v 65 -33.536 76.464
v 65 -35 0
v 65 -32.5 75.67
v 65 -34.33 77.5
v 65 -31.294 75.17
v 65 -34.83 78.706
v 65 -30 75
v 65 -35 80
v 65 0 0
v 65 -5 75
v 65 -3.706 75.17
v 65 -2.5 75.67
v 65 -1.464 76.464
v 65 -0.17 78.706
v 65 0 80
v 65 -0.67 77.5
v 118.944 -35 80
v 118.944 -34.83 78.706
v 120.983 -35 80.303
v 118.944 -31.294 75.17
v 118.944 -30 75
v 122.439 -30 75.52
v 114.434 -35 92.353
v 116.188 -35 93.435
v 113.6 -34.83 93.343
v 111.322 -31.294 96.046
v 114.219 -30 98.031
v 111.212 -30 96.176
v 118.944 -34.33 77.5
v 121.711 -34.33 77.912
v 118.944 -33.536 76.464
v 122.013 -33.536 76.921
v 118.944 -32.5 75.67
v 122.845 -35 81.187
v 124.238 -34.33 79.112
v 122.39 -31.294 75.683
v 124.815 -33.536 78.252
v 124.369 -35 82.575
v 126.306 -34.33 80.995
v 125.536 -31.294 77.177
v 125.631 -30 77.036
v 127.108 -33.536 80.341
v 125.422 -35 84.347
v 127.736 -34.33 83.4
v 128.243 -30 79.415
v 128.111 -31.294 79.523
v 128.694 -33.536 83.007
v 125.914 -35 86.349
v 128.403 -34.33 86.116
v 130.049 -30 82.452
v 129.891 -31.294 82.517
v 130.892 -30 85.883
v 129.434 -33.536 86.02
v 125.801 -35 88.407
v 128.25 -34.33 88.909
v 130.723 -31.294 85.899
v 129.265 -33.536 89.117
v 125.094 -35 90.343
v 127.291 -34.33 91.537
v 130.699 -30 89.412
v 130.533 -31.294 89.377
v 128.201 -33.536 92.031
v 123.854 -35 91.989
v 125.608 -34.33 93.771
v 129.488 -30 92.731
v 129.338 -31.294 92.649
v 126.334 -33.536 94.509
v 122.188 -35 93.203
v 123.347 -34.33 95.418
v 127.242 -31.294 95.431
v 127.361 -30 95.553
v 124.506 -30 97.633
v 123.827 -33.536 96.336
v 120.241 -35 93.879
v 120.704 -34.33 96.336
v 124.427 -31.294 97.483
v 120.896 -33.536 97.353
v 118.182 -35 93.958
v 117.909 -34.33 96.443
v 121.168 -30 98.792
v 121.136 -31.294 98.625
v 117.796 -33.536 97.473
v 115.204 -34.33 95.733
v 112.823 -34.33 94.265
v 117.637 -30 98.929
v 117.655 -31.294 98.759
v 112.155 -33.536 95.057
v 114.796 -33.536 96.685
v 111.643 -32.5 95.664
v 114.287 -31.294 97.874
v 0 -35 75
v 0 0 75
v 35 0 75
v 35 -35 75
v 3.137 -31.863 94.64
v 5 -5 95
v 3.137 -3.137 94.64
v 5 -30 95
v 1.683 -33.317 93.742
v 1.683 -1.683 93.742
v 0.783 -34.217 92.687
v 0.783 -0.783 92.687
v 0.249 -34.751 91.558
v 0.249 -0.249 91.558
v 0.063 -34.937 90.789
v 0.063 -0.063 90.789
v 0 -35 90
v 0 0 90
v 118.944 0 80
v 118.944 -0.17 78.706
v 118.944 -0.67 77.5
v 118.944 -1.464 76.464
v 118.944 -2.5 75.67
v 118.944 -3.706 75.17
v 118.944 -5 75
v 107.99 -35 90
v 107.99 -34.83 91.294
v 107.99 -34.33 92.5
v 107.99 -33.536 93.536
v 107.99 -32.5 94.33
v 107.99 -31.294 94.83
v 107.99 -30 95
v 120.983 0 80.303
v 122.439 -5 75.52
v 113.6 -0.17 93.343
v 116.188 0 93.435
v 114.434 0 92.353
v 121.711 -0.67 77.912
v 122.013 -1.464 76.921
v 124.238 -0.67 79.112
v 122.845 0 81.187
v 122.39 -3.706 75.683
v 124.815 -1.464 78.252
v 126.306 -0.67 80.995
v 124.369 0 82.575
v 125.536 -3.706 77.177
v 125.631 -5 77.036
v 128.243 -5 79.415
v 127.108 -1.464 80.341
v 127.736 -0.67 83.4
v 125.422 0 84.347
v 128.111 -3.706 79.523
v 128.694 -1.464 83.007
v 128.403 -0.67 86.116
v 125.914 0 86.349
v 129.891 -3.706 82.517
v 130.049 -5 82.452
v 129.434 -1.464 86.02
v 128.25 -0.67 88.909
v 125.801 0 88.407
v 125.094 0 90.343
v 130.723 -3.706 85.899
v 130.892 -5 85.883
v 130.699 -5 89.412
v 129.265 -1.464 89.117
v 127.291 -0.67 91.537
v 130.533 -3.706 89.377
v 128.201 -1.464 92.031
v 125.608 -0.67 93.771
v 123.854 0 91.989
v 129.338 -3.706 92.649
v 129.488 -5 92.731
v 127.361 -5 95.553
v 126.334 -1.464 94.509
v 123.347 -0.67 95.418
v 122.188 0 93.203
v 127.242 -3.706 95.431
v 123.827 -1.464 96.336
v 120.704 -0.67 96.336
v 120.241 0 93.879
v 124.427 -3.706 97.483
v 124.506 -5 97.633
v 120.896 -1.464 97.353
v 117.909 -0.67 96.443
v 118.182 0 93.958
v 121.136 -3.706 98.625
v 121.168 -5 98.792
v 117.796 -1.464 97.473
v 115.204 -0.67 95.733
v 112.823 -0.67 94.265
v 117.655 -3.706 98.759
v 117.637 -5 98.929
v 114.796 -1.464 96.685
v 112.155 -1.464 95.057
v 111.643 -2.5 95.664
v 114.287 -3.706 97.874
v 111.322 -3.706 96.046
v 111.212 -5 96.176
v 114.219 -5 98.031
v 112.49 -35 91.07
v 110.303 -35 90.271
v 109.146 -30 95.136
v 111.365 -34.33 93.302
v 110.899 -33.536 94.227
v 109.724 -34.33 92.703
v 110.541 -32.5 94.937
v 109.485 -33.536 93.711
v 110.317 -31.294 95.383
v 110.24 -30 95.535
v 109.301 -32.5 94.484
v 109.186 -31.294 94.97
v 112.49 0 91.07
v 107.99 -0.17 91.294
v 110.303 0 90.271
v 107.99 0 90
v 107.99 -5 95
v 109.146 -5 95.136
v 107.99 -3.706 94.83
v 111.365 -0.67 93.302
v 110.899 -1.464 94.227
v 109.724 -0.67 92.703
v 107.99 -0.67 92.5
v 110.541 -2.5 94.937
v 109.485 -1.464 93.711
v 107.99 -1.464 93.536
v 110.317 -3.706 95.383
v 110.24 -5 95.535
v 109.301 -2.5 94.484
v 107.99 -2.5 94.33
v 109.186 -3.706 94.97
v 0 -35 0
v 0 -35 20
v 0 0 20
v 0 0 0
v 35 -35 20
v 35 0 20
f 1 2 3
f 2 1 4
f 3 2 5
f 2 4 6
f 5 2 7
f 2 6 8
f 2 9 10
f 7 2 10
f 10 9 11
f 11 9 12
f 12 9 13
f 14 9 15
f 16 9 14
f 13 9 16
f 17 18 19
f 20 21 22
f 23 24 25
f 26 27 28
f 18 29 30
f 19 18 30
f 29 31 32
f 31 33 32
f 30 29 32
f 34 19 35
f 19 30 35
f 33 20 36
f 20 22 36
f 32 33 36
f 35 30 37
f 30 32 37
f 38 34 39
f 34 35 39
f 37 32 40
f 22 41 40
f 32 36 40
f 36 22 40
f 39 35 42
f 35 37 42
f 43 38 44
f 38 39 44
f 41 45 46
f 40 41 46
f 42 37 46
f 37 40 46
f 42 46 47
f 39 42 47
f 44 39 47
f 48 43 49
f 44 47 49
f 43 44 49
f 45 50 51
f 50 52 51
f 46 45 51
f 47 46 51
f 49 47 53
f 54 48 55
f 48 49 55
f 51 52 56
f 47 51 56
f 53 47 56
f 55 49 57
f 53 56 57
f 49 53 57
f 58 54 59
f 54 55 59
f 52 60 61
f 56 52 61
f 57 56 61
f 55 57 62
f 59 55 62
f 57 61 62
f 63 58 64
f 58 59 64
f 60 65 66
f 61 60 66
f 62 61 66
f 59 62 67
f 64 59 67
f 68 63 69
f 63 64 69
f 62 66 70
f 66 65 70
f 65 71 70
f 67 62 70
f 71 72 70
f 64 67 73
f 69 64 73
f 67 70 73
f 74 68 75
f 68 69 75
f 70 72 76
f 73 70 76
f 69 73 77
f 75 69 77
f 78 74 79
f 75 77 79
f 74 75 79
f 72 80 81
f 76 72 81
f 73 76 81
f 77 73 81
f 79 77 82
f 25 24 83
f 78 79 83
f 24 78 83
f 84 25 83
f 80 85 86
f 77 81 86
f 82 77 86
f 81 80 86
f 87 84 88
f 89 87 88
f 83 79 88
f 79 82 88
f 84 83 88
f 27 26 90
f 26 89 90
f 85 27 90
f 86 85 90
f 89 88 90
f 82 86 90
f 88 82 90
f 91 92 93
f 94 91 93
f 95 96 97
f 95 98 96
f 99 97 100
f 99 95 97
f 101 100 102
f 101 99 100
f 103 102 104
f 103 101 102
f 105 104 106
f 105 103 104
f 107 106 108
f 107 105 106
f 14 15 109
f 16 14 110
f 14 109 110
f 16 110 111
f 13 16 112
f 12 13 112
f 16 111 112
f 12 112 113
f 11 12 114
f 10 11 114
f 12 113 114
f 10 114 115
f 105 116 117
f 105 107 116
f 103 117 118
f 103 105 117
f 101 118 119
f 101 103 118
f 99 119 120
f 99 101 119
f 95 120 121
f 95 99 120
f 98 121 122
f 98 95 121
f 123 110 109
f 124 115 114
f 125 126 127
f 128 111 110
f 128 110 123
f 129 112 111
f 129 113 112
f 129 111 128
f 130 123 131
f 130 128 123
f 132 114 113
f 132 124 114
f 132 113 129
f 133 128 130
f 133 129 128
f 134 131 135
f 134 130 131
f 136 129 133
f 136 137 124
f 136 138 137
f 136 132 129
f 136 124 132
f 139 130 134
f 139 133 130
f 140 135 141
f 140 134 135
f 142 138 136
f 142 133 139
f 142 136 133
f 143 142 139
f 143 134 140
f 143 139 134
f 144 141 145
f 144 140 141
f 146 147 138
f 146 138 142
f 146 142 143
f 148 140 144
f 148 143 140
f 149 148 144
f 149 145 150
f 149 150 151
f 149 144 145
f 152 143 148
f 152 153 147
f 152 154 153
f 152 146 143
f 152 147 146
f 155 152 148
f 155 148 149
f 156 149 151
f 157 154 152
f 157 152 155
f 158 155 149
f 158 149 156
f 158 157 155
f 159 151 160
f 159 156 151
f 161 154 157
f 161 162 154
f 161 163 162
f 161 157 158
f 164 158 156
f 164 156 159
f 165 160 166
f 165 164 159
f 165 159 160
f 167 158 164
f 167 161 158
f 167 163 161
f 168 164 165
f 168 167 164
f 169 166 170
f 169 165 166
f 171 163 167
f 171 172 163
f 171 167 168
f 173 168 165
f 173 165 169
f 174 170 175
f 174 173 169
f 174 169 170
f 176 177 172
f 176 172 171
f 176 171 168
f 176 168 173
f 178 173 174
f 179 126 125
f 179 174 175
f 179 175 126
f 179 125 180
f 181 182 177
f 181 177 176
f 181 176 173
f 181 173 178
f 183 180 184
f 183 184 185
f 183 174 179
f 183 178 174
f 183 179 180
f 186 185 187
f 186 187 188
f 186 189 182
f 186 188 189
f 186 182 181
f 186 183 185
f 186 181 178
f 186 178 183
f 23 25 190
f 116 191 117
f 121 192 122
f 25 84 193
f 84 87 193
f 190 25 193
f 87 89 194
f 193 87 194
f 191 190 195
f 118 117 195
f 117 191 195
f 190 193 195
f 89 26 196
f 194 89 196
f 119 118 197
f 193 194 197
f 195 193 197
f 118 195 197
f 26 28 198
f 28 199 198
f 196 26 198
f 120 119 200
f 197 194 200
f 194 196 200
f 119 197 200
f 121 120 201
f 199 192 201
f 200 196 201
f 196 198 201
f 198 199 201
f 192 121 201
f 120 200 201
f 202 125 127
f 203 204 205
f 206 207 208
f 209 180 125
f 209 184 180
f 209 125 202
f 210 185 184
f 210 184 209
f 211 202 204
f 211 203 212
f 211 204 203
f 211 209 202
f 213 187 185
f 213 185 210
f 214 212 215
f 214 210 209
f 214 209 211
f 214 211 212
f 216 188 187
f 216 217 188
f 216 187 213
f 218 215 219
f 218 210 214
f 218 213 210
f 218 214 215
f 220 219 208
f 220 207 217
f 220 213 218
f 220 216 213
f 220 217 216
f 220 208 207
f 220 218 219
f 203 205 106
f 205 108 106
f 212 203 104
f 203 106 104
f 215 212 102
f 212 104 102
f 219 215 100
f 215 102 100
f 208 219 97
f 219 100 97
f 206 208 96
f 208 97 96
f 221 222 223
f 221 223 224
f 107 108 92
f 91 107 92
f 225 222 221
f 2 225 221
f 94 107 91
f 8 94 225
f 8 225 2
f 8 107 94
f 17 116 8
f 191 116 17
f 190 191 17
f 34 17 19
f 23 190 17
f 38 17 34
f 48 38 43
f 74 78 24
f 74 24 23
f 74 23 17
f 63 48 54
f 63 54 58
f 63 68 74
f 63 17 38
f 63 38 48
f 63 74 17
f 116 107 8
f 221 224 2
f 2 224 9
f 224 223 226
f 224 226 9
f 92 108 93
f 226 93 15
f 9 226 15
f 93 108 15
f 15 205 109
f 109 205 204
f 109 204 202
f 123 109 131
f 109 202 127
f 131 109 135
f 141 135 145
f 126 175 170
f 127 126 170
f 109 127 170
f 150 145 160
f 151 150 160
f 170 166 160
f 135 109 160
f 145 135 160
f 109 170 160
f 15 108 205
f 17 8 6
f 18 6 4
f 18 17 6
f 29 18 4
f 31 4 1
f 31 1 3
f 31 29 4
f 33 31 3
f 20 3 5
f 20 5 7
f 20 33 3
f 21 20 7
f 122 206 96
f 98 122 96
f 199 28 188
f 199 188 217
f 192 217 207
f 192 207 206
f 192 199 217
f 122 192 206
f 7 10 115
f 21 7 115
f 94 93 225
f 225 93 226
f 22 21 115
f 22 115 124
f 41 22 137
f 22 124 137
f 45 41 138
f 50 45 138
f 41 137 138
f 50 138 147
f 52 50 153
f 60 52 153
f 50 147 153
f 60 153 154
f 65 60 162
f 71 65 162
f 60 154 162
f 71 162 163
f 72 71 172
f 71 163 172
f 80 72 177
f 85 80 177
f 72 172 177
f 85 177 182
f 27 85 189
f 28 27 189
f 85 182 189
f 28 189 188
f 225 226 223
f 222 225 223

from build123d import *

# Parameters (mm, degrees)
F1_DEPTH = 35
F2_F1_R  = 5
F2_F2_R  = 5


with BuildPart() as f1:
    # F0 (on Front) → F1 (new body)
    with BuildSketch(Plane.XZ):
        with BuildLine():
            Line((0, 20), (0, 0))
            Line((0, 0), (65, 0))
            Line((65, 0), (65, 75))
            Line((65, 75), (118.94427191, 75))
            ThreePointArc((118.94427191, 75), (129.8987230601, 91.8989794856), (110, 95))
            Line((110, 95), (0, 95))
            Line((0, 95), (0, 75))
            Line((0, 75), (35, 75))
            Line((35, 75), (35, 20))
            Line((35, 20), (0, 20))
        make_face()
    extrude(amount=F1_DEPTH)

    # F2: fillet of radius 5 on 4 edges, made by hand

    # F2_f1
    f2_f1_edges = [f1.edges().sort_by_distance(p)[0] for p in [
        (110, -17.5, 95),
    ]]
    fillet(f2_f1_edges, radius=F2_F1_R)

    # F2_f2
    f2_f2_edges = [f1.edges().sort_by_distance(p)[0] for p in [
        (0, -17.5, 95),
        (53.9949103799, 0, 95),
        (53.9949103799, -35, 95),
        (109.7048066113, -35, 95.3033178169),
        (109.7048066113, 0, 95.3033178169),
    ]]
    fillet(f2_f2_edges, radius=F2_F2_R)


solid = f1.part
